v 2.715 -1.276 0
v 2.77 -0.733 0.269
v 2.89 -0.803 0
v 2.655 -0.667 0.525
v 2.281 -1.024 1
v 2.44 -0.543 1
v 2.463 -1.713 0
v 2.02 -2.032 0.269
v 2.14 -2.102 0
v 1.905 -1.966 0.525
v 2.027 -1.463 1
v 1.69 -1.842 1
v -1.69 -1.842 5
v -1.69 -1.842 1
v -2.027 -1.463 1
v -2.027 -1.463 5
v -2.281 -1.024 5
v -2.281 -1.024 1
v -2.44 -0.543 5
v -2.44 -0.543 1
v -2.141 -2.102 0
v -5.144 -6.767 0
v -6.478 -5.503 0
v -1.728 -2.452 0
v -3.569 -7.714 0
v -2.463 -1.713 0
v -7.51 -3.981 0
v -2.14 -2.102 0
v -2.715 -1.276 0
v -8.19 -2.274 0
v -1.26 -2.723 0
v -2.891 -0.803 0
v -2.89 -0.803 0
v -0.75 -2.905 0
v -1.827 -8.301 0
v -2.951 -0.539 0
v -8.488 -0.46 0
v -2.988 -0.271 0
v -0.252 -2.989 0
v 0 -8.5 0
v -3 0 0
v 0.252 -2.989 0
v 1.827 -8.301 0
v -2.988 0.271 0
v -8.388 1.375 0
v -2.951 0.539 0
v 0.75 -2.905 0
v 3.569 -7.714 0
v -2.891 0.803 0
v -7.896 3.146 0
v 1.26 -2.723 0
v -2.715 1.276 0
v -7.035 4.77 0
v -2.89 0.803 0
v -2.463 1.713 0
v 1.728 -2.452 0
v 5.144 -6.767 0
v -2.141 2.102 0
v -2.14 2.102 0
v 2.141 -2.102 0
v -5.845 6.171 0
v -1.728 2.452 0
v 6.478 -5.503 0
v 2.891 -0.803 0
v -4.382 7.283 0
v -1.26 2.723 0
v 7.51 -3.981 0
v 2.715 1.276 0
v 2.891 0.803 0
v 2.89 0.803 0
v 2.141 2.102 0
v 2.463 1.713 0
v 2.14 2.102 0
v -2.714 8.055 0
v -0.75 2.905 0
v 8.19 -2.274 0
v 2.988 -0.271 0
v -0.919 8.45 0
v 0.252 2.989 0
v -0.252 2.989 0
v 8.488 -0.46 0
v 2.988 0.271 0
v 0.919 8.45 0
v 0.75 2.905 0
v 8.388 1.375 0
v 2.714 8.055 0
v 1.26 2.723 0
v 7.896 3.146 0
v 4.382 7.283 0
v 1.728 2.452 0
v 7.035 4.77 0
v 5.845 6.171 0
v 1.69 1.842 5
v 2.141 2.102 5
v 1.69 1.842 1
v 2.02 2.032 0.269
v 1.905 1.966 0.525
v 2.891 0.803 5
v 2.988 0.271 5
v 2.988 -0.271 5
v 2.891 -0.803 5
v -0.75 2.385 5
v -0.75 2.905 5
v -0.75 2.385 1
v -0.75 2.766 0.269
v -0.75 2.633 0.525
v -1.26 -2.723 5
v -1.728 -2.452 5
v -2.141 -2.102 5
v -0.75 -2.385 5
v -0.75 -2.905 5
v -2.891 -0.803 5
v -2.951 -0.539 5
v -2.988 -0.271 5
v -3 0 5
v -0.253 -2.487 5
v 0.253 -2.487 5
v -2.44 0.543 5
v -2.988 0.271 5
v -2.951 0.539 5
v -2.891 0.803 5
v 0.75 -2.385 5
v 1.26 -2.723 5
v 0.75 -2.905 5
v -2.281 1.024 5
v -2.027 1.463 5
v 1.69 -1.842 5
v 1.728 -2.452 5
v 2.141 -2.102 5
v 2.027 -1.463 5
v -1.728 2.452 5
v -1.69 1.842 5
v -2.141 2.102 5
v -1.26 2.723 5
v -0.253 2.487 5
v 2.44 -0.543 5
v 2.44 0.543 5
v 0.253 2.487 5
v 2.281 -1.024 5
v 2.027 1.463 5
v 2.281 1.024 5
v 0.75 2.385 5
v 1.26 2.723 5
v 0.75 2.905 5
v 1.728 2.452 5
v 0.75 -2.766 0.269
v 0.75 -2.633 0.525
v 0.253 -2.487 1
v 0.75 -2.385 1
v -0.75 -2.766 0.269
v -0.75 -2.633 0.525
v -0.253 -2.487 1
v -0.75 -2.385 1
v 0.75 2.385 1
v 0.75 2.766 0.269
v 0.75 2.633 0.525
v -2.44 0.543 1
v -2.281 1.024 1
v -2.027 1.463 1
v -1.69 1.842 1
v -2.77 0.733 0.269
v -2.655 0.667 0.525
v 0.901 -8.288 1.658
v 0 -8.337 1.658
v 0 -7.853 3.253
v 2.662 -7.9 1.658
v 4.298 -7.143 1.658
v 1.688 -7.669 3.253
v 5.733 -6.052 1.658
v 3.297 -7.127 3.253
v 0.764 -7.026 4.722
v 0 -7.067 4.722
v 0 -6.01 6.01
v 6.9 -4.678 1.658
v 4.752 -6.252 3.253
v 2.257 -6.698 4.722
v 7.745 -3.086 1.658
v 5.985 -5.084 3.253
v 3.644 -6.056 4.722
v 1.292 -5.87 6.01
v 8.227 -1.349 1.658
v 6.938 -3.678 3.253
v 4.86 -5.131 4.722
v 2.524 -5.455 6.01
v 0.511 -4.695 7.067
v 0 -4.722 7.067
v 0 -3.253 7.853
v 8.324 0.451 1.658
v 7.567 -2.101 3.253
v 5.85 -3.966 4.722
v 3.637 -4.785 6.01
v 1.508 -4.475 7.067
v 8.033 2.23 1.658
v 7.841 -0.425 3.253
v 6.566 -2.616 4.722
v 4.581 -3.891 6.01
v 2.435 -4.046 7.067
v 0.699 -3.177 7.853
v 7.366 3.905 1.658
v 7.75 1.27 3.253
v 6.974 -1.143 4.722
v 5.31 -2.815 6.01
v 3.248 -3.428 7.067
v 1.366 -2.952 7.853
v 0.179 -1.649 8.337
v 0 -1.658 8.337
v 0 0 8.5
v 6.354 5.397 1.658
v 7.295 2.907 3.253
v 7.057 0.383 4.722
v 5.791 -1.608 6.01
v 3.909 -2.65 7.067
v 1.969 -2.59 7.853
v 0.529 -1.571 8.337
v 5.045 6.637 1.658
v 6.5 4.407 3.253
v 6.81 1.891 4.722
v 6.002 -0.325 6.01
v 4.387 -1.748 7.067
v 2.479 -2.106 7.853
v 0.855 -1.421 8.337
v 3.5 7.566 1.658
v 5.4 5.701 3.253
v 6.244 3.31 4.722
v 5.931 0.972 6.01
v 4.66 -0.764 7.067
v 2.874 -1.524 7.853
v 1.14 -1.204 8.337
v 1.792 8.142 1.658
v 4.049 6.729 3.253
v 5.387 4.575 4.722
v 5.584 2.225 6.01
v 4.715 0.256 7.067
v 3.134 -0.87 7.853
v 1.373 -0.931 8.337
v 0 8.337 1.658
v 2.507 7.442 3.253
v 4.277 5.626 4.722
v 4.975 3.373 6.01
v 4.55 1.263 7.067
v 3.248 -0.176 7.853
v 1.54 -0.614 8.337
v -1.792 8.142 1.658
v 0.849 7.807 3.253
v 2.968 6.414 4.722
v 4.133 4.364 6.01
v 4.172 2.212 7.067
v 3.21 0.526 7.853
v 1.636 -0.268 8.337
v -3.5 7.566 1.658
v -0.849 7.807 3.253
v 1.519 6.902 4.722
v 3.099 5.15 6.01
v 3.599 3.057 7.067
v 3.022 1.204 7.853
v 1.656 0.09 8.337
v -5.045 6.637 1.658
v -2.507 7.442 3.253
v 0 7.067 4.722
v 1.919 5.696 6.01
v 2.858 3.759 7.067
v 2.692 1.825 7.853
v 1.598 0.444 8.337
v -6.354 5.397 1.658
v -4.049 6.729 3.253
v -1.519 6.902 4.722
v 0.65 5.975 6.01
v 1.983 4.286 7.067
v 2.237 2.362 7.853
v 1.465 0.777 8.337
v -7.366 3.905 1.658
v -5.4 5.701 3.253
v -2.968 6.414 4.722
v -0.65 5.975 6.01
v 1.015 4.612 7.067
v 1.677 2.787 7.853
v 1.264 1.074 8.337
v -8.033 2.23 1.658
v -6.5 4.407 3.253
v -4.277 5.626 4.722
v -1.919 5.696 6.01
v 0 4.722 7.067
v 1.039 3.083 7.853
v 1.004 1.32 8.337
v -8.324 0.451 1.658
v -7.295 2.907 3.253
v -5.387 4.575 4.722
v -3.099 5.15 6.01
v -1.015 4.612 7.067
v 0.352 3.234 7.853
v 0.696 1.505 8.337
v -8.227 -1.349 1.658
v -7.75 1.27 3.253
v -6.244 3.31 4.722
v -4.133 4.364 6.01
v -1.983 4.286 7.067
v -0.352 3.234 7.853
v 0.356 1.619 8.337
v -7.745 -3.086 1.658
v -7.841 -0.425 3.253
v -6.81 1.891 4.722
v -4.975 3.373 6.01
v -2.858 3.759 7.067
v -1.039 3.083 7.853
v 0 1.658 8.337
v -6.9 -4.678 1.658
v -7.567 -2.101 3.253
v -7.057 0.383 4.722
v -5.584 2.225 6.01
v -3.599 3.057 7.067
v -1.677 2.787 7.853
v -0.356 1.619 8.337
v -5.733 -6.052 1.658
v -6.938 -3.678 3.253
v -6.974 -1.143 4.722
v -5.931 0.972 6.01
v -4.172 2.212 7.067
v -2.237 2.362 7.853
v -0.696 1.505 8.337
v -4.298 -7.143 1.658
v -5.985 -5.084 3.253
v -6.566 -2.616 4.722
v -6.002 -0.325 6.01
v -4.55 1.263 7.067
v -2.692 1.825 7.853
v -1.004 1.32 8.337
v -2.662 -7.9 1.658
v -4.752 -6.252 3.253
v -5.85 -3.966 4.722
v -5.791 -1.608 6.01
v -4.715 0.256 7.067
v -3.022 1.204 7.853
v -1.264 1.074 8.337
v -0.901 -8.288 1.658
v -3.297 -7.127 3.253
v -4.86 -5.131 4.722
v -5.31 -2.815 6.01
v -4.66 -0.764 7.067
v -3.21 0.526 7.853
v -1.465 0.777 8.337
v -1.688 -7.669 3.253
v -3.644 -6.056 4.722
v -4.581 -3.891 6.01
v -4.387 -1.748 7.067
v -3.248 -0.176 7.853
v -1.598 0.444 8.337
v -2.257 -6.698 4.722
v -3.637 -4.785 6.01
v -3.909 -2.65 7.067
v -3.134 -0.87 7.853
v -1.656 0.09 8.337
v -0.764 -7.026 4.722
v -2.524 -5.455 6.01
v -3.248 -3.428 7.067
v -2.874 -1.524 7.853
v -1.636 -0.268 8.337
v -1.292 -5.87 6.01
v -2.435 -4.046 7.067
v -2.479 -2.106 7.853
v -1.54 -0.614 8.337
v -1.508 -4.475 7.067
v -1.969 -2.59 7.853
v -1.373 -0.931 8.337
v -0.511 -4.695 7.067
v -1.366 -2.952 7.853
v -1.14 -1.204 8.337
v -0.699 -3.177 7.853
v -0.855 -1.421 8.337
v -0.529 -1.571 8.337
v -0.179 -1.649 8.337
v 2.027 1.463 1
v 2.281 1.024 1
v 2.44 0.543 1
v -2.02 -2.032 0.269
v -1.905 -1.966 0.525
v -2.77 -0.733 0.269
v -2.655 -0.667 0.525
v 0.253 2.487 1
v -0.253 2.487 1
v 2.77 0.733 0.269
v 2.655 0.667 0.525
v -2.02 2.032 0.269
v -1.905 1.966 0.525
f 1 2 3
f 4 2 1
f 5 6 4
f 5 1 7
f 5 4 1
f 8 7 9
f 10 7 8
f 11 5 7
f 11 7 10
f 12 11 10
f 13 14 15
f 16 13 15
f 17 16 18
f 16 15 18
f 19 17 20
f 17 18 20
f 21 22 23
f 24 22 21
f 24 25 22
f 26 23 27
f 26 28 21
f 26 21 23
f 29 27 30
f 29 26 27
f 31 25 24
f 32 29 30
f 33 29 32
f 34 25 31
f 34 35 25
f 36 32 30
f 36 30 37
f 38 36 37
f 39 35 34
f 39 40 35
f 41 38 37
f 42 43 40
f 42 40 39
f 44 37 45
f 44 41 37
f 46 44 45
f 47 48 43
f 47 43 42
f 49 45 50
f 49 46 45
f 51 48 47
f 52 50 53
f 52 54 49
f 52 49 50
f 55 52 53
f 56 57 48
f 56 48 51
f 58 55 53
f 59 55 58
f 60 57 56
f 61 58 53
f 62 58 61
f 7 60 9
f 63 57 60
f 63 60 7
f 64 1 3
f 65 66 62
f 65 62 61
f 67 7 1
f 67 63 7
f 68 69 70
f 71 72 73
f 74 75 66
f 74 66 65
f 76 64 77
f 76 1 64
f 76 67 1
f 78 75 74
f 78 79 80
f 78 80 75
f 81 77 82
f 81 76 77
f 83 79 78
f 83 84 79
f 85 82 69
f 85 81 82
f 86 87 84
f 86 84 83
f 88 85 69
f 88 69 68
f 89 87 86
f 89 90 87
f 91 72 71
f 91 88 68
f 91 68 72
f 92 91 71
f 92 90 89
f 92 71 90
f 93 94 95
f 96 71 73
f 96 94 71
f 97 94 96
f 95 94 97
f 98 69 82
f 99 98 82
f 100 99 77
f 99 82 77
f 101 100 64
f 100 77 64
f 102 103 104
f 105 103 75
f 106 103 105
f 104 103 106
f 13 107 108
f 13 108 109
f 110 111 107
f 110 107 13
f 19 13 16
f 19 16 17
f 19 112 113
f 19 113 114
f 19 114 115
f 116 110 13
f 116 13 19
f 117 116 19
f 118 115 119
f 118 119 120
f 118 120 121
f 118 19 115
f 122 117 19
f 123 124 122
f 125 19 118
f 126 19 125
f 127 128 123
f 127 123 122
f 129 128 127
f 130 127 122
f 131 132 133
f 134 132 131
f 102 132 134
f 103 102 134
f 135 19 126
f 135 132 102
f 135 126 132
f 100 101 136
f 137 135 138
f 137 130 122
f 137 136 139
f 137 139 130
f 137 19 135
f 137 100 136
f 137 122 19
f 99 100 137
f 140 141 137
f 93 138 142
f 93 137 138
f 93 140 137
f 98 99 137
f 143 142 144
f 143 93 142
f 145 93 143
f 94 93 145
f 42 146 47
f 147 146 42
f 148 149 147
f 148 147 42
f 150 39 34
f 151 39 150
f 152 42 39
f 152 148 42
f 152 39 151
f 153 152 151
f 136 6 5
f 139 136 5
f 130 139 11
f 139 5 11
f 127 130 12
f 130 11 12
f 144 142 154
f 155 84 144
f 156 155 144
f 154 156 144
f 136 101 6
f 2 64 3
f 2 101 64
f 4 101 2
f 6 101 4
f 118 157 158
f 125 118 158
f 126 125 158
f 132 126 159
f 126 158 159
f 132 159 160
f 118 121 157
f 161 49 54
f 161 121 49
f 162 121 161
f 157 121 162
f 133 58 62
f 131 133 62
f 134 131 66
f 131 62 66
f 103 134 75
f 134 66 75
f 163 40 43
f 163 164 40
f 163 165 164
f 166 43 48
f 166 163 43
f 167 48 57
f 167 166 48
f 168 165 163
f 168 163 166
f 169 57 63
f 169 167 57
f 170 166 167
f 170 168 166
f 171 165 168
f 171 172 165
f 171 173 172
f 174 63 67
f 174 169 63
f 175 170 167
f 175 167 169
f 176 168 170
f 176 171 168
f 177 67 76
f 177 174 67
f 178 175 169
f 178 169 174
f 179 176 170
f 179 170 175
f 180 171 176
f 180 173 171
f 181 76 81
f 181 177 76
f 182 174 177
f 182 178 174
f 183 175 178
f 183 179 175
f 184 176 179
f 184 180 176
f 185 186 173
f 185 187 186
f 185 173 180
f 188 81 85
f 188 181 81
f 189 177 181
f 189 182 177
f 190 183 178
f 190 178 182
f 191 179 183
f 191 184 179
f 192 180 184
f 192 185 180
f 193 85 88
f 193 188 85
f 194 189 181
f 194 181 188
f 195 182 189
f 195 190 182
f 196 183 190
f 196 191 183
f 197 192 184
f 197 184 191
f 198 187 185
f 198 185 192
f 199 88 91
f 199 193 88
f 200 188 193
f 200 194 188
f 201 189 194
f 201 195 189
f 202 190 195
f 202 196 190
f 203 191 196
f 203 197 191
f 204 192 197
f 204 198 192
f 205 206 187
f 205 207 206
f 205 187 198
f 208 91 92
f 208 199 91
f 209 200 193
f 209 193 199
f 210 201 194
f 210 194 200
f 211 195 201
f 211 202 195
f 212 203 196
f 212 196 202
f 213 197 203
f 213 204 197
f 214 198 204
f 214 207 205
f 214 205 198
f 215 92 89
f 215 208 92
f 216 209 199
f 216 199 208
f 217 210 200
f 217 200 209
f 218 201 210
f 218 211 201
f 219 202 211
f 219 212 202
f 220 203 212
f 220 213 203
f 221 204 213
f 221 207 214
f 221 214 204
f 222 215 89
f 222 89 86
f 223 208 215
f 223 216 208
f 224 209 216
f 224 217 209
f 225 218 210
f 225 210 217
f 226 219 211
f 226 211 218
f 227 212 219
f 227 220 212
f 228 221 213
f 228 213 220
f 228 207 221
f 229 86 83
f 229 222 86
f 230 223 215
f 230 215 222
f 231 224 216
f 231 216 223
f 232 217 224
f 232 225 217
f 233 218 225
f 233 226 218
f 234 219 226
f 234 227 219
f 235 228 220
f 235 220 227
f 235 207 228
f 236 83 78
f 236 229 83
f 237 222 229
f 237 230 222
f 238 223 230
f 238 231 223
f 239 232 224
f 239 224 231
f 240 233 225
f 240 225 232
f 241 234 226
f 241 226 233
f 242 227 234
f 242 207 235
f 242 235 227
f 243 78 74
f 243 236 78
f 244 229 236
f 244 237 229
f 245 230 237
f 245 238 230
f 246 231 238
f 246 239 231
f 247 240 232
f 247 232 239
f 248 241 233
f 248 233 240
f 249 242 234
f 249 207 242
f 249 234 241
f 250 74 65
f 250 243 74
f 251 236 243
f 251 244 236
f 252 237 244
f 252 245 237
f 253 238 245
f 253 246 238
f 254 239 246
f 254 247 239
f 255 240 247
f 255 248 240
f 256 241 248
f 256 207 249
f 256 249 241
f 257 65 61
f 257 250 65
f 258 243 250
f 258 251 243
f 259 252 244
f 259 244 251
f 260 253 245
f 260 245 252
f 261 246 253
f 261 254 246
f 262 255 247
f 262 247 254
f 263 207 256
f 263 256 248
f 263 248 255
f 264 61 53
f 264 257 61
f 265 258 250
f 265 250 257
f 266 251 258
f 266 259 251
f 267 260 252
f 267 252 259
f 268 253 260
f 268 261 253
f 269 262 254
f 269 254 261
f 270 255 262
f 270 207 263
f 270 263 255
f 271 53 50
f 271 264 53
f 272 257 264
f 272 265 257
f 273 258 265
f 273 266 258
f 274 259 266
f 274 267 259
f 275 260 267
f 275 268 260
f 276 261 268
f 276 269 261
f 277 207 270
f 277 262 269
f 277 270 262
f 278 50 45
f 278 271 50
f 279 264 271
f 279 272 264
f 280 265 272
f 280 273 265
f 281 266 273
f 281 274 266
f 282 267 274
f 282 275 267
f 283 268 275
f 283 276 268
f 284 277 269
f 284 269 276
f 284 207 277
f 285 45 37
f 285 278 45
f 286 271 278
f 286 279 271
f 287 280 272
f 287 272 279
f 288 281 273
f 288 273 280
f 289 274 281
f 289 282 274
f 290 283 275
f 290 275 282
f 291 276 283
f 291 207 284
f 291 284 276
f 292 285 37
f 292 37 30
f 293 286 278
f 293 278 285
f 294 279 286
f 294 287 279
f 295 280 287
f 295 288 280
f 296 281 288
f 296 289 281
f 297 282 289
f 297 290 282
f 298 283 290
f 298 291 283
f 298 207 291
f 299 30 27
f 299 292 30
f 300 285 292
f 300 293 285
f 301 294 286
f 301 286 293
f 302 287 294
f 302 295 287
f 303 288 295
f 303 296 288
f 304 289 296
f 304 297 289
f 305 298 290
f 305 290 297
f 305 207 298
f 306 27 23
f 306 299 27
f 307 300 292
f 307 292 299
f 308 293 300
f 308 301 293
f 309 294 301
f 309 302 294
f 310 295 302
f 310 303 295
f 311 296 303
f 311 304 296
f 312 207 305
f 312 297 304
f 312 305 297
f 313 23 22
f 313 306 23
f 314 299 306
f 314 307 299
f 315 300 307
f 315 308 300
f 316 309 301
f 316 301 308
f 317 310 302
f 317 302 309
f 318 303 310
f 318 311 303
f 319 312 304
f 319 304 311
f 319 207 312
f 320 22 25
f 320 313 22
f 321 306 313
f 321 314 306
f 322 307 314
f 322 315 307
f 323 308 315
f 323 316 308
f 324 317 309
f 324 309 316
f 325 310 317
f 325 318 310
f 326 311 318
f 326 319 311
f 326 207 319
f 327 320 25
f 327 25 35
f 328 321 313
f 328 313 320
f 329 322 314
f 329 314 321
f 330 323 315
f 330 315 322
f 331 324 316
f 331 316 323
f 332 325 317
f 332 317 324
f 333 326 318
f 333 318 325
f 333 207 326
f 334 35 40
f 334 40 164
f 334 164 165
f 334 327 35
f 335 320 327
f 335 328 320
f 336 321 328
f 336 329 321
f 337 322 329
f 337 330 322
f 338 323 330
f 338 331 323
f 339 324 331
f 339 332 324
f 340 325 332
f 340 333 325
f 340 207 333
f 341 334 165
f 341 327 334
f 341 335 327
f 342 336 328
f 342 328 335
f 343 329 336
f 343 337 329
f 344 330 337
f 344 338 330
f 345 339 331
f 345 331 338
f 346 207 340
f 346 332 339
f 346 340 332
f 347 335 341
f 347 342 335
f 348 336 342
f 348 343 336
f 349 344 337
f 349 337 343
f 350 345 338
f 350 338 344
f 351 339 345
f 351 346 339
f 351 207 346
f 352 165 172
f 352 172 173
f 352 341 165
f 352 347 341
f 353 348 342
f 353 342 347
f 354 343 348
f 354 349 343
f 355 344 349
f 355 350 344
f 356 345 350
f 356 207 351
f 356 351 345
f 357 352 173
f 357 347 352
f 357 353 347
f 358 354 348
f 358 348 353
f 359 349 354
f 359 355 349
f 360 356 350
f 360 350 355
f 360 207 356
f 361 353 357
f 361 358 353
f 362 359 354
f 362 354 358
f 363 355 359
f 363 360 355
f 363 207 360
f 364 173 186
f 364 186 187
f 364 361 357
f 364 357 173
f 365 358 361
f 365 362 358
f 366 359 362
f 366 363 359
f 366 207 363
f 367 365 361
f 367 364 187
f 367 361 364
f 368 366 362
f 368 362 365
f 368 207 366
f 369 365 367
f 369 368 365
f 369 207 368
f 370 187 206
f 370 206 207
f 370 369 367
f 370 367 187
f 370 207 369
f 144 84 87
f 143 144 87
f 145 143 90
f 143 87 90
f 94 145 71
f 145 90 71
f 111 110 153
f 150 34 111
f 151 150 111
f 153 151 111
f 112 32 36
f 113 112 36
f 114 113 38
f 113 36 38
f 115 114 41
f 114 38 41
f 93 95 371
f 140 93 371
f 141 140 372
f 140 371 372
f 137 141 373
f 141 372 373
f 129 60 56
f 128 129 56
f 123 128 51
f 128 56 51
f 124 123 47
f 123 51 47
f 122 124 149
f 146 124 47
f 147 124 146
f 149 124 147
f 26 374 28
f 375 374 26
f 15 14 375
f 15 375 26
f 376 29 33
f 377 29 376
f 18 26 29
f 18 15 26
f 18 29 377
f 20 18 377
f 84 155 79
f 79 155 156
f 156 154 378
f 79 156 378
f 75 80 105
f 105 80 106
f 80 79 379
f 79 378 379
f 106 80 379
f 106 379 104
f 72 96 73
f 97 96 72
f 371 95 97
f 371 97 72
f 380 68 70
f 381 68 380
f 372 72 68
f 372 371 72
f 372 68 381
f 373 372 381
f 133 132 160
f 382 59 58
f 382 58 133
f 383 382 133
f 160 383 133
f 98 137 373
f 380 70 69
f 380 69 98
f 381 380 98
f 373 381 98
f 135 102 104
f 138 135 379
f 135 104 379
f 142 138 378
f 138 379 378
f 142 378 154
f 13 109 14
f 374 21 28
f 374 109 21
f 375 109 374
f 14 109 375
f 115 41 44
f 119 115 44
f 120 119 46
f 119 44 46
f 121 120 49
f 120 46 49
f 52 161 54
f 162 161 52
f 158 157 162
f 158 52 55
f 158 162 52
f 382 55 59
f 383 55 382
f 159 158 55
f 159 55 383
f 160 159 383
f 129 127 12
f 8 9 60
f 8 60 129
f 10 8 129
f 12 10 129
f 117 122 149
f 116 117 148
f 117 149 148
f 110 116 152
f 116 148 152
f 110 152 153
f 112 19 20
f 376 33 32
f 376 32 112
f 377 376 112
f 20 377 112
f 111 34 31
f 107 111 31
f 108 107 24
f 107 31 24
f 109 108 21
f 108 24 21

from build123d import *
from OCP.BRepFilletAPI import BRepFilletAPI_MakeChamfer

# Parameters (mm, degrees)
SKETCH2_R          = 2.5
CUT_EXTRUDE1_DEPTH = 5
CUT_EXTRUDE2_DEPTH = 5
CHAMFER2_SIZE      = 0.5
CHAMFER2_SIZE_2    = 1


with BuildPart() as part:
    # Sketch1 → Revolve1 (revolve)
    with BuildSketch(Plane(origin=(0, 0, 0), x_dir=(0, 0, -1), z_dir=(1, 0, 0))):
        with BuildLine():
            Line((0, 0), (0, -8.5))
            ThreePointArc((0, -8.5), (-6.01040764, -6.01040764), (-8.5, 0))
            Line((-8.5, 0), (0, 0))
        make_face()
    revolve(axis=Axis((0, 0, 0), (0, 0, 1)))

    # Sketch2 → Cut-Extrude1 (cut)
    with BuildSketch(Plane(origin=(0, 0, 0), x_dir=(-1, 0, 0), z_dir=(0, 0, -1))):
        with Locations(Location((0, 0, 0), (0, 0, 90))):
            Circle(SKETCH2_R)
    extrude(amount=-CUT_EXTRUDE1_DEPTH, mode=Mode.SUBTRACT)

    # Sketch3 → Cut-Extrude2 (cut)
    with BuildSketch(Plane(origin=(0, 0, 0), x_dir=(-1, 0, 0), z_dir=(0, 0, -1))):
        with BuildLine():
            ThreePointArc((-0.75, 2.90473751), (-1.5, 2.598076211), (-2.140576475, 2.101887808))
            Line((-2.140576475, 2.101887808), (-1.690338955, 1.841943055))
            ThreePointArc((-1.690338955, 1.841943055), (-1.25, 2.165063509), (-0.75, 2.384848004))
            Line((-0.75, 2.384848004), (-0.75, 2.90473751))
        make_face()
        with BuildLine():
            Line((1.690338955, 1.841943055), (2.140576475, 2.101887808))
            ThreePointArc((2.140576475, 2.101887808), (1.5, 2.598076211), (0.75, 2.90473751))
            Line((0.75, 2.90473751), (0.75, 2.384848004))
            ThreePointArc((0.75, 2.384848004), (1.25, 2.165063509), (1.690338955, 1.841943055))
        make_face()
        with BuildLine():
            Line((2.440338955, -0.542904949), (2.890576475, -0.802849702))
            ThreePointArc((2.890576475, -0.802849702), (2.972518244, -0.405136135), (3, 0))
            ThreePointArc((3, 0), (2.972518244, 0.405136135), (2.890576475, 0.802849702))
            Line((2.890576475, 0.802849702), (2.440338955, 0.542904949))
            ThreePointArc((2.440338955, 0.542904949), (2.485039978, 0.273086627), (2.5, 0))
            ThreePointArc((2.5, 0), (2.485039978, -0.273086627), (2.440338955, -0.542904949))
        make_face()
        with BuildLine():
            Line((0.75, -2.384848004), (0.75, -2.90473751))
            ThreePointArc((0.75, -2.90473751), (1.5, -2.598076211), (2.140576475, -2.101887808))
            Line((2.140576475, -2.101887808), (1.690338955, -1.841943055))
            ThreePointArc((1.690338955, -1.841943055), (1.25, -2.165063509), (0.75, -2.384848004))
        make_face()
        with BuildLine():
            ThreePointArc((-2.140576475, -2.101887808), (-1.5, -2.598076211), (-0.75, -2.90473751))
            Line((-0.75, -2.90473751), (-0.75, -2.384848004))
            ThreePointArc((-0.75, -2.384848004), (-1.25, -2.165063509), (-1.690338955, -1.841943055))
            Line((-1.690338955, -1.841943055), (-2.140576475, -2.101887808))
        make_face()
        with BuildLine():
            ThreePointArc((-2.890576475, 0.802849702), (-3, 0), (-2.890576475, -0.802849702))
            Line((-2.890576475, -0.802849702), (-2.440338955, -0.542904949))
            ThreePointArc((-2.440338955, -0.542904949), (-2.5, 0), (-2.440338955, 0.542904949))
            Line((-2.440338955, 0.542904949), (-2.890576475, 0.802849702))
        make_face()
    extrude(amount=-CUT_EXTRUDE2_DEPTH, mode=Mode.SUBTRACT)

    # Chamfer2
    chamfer2_edges_1 = [part.edges().sort_by_distance(p)[0] for p in [
        (-2.165063509, 1.25, 0),
    ]]
    chamfer2_side_1 = [part.faces().sort_by_distance(p)[0] for p in [
        (-2.173723763, 1.255, 0),
    ]]
    chamfer2_edges_2 = [part.edges().sort_by_distance(p)[0] for p in [
        (2.165063509, -1.25, 0),
    ]]
    chamfer2_side_2 = [part.faces().sort_by_distance(p)[0] for p in [
        (2.173723763, -1.255, 0),
    ]]
    chamfer2_edges_3 = [part.edges().sort_by_distance(p)[0] for p in [
        (0, 2.5, 0),
    ]]
    chamfer2_side_3 = [part.faces().sort_by_distance(p)[0] for p in [
        (0, 2.51, 0),
    ]]
    chamfer2_edges_4 = [part.edges().sort_by_distance(p)[0] for p in [
        (0, -2.5, 0),
    ]]
    chamfer2_side_4 = [part.faces().sort_by_distance(p)[0] for p in [
        (0, -2.51, 0),
    ]]
    chamfer2_edges_5 = [part.edges().sort_by_distance(p)[0] for p in [
        (2.165063509, 1.25, 0),
    ]]
    chamfer2_side_5 = [part.faces().sort_by_distance(p)[0] for p in [
        (2.173723763, 1.255, 0),
    ]]
    chamfer2_edges_6 = [part.edges().sort_by_distance(p)[0] for p in [
        (-2.165063509, -1.25, 0),
    ]]
    chamfer2_side_6 = [part.faces().sort_by_distance(p)[0] for p in [
        (-2.173723763, -1.255, 0),
    ]]
    chamfer2 = BRepFilletAPI_MakeChamfer(part.part.solid().wrapped)
    for e in chamfer2_edges_1:
        chamfer2.Add(CHAMFER2_SIZE - 0.0001, CHAMFER2_SIZE_2 - 0.0001, e.wrapped, chamfer2_side_1[0].wrapped)
    for e in chamfer2_edges_2:
        chamfer2.Add(CHAMFER2_SIZE - 0.0001, CHAMFER2_SIZE_2 - 0.0001, e.wrapped, chamfer2_side_2[0].wrapped)
    for e in chamfer2_edges_3:
        chamfer2.Add(CHAMFER2_SIZE - 0.0001, CHAMFER2_SIZE_2 - 0.0001, e.wrapped, chamfer2_side_3[0].wrapped)
    for e in chamfer2_edges_4:
        chamfer2.Add(CHAMFER2_SIZE - 0.0001, CHAMFER2_SIZE_2 - 0.0001, e.wrapped, chamfer2_side_4[0].wrapped)
    for e in chamfer2_edges_5:
        chamfer2.Add(CHAMFER2_SIZE - 0.0001, CHAMFER2_SIZE_2 - 0.0001, e.wrapped, chamfer2_side_5[0].wrapped)
    for e in chamfer2_edges_6:
        chamfer2.Add(CHAMFER2_SIZE - 0.0001, CHAMFER2_SIZE_2 - 0.0001, e.wrapped, chamfer2_side_6[0].wrapped)
    add(Compound.cast(chamfer2.Shape()), mode=Mode.REPLACE)  # a hair under: the kernel refuses the full size


solid = part.part
